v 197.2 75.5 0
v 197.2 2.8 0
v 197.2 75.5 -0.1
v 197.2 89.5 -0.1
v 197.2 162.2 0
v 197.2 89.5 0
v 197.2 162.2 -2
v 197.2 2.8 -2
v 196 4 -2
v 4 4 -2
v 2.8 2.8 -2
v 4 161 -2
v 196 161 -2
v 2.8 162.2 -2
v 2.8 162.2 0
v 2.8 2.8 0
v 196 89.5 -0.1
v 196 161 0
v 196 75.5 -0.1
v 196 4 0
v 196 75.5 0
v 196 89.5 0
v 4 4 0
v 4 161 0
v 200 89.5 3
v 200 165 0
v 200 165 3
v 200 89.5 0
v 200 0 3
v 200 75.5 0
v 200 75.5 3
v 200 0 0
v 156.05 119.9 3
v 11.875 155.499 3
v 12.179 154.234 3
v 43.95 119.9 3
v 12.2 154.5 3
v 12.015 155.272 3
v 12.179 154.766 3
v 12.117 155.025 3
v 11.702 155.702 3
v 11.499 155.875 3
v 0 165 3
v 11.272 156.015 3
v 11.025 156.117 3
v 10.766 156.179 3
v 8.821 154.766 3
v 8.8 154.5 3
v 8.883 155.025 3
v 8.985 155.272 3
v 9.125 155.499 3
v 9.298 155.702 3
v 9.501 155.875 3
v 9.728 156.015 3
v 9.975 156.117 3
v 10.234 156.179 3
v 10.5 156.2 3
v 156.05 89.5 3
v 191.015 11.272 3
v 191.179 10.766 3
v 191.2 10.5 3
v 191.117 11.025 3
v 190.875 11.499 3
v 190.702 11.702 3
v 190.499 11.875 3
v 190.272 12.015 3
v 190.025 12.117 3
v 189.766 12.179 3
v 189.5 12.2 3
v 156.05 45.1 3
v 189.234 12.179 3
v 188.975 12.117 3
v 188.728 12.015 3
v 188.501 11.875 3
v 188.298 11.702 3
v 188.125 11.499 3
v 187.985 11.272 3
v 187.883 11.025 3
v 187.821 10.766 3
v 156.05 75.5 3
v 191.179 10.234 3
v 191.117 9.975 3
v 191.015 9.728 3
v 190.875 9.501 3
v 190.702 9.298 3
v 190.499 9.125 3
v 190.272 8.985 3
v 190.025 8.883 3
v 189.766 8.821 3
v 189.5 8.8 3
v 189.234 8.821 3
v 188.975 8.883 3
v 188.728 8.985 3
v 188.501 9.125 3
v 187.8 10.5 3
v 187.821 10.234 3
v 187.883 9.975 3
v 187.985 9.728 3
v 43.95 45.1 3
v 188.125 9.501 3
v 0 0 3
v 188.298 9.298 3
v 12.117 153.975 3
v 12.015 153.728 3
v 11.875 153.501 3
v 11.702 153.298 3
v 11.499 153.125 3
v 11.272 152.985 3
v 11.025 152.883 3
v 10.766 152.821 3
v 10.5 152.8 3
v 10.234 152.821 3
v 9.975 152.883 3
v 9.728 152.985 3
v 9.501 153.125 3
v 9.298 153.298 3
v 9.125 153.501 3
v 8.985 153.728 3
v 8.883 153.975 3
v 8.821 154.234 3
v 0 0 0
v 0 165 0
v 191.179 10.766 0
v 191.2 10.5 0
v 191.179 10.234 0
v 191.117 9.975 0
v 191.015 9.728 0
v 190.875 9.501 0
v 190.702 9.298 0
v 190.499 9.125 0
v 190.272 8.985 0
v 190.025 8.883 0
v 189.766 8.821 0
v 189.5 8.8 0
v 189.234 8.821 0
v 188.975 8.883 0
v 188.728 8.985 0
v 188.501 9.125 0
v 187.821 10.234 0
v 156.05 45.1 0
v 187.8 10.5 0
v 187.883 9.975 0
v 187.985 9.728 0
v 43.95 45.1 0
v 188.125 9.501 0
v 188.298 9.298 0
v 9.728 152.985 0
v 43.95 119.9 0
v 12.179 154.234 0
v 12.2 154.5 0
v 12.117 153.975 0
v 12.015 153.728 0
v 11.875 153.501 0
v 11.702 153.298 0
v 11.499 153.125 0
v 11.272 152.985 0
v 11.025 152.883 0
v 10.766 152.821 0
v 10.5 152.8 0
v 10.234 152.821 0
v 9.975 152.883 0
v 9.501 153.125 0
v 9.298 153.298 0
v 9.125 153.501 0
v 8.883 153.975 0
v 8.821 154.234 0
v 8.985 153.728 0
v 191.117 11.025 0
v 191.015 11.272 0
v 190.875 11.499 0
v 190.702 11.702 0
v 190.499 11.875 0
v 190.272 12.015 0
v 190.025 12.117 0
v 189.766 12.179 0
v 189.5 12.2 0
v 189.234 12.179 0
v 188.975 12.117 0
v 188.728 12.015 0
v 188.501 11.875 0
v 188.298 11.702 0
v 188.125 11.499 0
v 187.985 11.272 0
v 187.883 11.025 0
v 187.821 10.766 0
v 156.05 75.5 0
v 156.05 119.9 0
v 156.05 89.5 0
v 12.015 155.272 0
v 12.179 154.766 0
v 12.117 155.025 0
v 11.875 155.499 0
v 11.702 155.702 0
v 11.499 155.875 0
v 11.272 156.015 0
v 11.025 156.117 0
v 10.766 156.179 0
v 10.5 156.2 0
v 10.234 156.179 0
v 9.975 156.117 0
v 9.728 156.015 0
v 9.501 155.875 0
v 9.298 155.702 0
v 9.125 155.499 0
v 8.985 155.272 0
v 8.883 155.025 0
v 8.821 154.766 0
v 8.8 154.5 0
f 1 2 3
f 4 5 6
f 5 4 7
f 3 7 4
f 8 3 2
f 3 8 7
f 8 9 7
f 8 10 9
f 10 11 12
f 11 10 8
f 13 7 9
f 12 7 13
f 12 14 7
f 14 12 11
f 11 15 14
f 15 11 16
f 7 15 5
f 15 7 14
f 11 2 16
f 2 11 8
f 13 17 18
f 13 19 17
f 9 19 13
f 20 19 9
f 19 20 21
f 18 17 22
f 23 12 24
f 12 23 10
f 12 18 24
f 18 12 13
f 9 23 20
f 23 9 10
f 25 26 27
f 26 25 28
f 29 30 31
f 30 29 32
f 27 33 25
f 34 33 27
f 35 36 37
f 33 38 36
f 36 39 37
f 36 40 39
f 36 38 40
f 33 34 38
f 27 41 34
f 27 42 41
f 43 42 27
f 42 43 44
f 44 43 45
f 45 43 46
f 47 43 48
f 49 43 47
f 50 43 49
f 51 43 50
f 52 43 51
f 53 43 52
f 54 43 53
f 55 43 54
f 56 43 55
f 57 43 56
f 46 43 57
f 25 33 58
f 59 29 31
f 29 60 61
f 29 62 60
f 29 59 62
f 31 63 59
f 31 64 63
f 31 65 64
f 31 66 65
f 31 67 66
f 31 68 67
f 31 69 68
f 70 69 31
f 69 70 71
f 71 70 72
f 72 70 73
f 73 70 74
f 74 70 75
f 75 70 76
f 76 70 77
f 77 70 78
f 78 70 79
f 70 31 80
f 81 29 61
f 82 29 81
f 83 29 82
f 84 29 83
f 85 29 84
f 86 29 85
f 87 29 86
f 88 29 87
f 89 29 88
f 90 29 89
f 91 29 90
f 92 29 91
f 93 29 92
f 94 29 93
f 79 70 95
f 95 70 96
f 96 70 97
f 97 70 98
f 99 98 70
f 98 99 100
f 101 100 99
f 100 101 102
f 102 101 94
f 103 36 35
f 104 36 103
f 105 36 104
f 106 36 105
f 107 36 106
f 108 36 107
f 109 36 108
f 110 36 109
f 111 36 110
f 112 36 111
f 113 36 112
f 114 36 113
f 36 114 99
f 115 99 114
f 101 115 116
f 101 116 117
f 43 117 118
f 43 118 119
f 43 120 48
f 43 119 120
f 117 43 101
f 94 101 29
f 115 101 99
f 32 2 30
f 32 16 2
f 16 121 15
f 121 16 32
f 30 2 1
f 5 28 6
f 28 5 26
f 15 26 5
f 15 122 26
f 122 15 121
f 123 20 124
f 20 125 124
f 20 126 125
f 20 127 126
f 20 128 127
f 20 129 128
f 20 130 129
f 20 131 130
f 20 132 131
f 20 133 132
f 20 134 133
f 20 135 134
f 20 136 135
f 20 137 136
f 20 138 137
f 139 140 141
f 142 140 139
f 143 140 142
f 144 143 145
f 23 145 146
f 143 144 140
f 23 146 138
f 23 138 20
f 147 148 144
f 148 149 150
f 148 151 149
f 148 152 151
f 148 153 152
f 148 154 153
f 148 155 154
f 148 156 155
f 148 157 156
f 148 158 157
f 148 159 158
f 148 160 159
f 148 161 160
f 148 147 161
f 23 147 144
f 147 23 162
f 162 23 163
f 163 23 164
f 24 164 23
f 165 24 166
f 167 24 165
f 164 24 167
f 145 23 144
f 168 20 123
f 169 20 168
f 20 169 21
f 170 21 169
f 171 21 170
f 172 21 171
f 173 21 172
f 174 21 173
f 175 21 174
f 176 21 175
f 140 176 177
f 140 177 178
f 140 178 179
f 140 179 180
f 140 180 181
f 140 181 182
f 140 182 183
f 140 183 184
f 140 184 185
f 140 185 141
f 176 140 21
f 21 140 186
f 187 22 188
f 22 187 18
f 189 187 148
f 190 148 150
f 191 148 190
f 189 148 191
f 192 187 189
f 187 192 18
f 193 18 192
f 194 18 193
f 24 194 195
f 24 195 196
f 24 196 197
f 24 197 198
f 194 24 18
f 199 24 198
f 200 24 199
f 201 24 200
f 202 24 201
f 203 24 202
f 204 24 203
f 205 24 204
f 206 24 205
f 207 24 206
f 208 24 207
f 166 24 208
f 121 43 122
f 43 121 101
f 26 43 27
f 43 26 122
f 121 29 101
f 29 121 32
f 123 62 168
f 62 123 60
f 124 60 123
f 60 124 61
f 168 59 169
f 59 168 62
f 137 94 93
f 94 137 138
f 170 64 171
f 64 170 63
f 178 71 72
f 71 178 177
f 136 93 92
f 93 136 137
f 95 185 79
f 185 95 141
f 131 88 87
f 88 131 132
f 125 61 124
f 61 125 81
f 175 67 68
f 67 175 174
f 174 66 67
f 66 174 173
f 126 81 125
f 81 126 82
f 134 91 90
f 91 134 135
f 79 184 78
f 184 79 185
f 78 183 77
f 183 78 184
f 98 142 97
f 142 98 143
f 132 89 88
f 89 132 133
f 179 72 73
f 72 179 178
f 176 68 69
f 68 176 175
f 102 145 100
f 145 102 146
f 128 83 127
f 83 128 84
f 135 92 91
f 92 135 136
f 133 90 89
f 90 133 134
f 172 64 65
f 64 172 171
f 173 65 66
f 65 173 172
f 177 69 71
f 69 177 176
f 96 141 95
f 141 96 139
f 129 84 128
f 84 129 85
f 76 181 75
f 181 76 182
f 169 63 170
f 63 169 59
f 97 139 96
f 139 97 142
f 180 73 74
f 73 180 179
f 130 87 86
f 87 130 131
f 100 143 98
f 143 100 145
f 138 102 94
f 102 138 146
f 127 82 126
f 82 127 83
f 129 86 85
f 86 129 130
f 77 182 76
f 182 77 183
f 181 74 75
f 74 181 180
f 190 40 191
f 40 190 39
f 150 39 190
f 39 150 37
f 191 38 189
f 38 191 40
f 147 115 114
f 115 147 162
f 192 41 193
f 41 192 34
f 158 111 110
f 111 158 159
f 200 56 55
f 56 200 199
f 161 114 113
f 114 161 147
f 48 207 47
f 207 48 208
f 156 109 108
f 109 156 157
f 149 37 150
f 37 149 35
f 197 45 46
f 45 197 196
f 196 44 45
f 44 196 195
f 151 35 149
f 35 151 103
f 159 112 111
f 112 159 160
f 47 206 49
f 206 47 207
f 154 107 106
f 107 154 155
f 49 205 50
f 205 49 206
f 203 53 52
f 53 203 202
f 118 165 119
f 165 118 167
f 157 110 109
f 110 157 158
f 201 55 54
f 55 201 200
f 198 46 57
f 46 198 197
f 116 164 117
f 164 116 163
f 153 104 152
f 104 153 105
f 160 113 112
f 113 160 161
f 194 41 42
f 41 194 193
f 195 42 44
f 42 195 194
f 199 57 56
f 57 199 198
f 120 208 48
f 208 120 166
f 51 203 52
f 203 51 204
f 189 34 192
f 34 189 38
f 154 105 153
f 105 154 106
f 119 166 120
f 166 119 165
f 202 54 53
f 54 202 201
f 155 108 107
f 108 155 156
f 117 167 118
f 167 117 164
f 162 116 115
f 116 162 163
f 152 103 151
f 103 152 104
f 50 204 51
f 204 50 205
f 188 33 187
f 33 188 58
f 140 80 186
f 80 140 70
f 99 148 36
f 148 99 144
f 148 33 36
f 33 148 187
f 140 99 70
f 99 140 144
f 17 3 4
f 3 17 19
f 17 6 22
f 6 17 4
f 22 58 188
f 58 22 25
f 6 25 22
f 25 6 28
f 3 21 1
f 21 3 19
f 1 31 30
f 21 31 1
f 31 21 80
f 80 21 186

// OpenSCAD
// =============================================================================
// DOA Flat Enclosure - LID (Waveshare ESP32-S3-Touch-LCD-4.3B BOX)
// =============================================================================
//
// DESIGN 1: Drop-through mount
//
// Mates with doa_enclosure_body.scad (same lip/boss geometry as original lid).
// The Waveshare 4.3B BOX enclosure drops through a cutout from below.
// The front face lip (116.30 x 79.00) rests on the lid top surface.
// Body walls provide XY registration; lip + gravity provide Z retention.
// A USB cable slit on the right side routes a cable into the enclosure.
//
// Print orientation: lid flat on bed, top face up (lip hangs down).
// =============================================================================

$fn = 40;

// =============================================================================
// BODY-DERIVED CONSTANTS  --  keep in sync with doa_enclosure_body.scad
// =============================================================================

wall       = 2.5;
interior_w = 195;
interior_d = 160;
interior_h = 52;

enc_w = interior_w + 2*wall;    // 200 mm
enc_d = interior_d + 2*wall;    // 165 mm

ledge_drop = 2;

lid_boss_pos = [
    [interior_w - 8,   8],
    [8,                interior_d - 8]
];
m3_clear_d = 3.4;

// =============================================================================
// LID GEOMETRY
// =============================================================================

lid_t   = 3.0;    // top plate thickness
lip_t   = 1.2;    // downward lip wall thickness
lip_clr = 0.3;    // clearance between lip and interior wall
lip_h   = ledge_drop;

// =============================================================================
// WAVESHARE ESP32-S3-TOUCH-LCD-4.3B  BOX  PARAMETERS
// (from Waveshare dimensional drawing, unit: mm)
// =============================================================================
//
//   Front face (glass up) ........ 116.30 x 79.00 mm
//   Body (behind lip) ............ 111.30 x 74.00 mm  (tapered shell)
//   Lip step ..................... 2.50 mm all around
//   Total depth .................. 18.00 mm
//   Active area .................. 95.54 x 54.36 mm (800x480)
//   Active area offset ........... 10.38 mm left, 10.38 mm top
//                                  10.38 mm right, 14.26 mm bottom (asymmetric)
//   Mounting holes (back) ........ 75.00 x 59.00 mm c-to-c, M4 brass inserts
//   USB-C port ................... right short edge, 2.50 mm from front face
//   Terminal block ............... bottom edge of back, 52.50 x 3.50 mm protrusion
//
// NOTE: box_body_h = 74.00 is estimated from drawing (front_h - 2*lip_step).
// Measure with calipers and adjust if the vertical taper differs from horizontal.

// Front face dimensions
box_front_w = 116.30;
box_front_h =  79.00;

// Body dimensions (tapered shell behind the front face lip)
box_body_w  = 111.30;
box_body_h  =  74.00;

// Shell taper / lip overhang
box_lip_step = (box_front_w - box_body_w) / 2;   // 2.50 mm

// Total depth
box_depth = 18.00;

// Active area
box_active_w   =  95.54;
box_active_h   =  54.36;
box_active_x   =  10.38;   // from left front face edge
box_active_y_top = 10.38;  // from top front face edge
// bottom border: 79.00 - 54.36 - 10.38 = 14.26 mm

// USB-C port location (right short edge)
usb_c_from_front = 2.50;   // port center, from front face surface
usb_c_port_w     = 10.0;   // clearance width for cable+connector

// =============================================================================
// CUTOUT PARAMETERS
// =============================================================================

body_clr = 0.40;    // clearance around body in through-hole

// Through-hole sized to body (BOX body passes through, lip catches)
cutout_w = box_body_w + 2*body_clr;    // ~112.10
cutout_h = box_body_h + 2*body_clr;    // ~74.80

// =============================================================================
// BOX PLACEMENT ON LID
// =============================================================================
// Centered on lid. USB-C faces right (high-X direction).
// Adjust these if you want to shift the display position.

box_center_x = enc_w / 2;
box_center_y = enc_d / 2;

// Origin = bottom-left corner of front face (in lid coords)
box_origin_x = box_center_x - box_front_w / 2;
box_origin_y = box_center_y - box_front_h / 2;

// Body origin (offset inward by lip step)
body_origin_x = box_origin_x + box_lip_step;
body_origin_y = box_origin_y + box_lip_step;

// =============================================================================
// USB CABLE SLIT
// =============================================================================
// Slit from the cutout's right edge toward the lid perimeter,
// allowing a USB-C cable to route from the BOX port into the enclosure.

usb_slit_w     = 14.0;    // wide enough for USB-C connector + cable
usb_slit_depth = lid_t;   // full lid thickness
// Vertical position: centered on box short edge
usb_slit_y     = box_center_y;

// =============================================================================
// RENDER
// =============================================================================

difference() {
    union() {
        top_plate();
        lid_lip();
    }
    body_corner_clearances();
    box_cutout();
    usb_cable_slit();
}

// Uncomment to visualize display placement:
 %preview_box();

// =============================================================================
// MODULES
// =============================================================================

module top_plate() {
    cube([enc_w, enc_d, lid_t]);
}

module lid_lip() {
    lip_outer_w = interior_w - 2*lip_clr;
    lip_outer_d = interior_d - 2*lip_clr;
    translate([wall + lip_clr, wall + lip_clr, -lip_h])
    difference() {
        cube([lip_outer_w, lip_outer_d, lip_h + 0.01]);
        translate([lip_t, lip_t, -0.1])
            cube([lip_outer_w - 2*lip_t,
                  lip_outer_d - 2*lip_t,
                  lip_h + 0.3]);
    }
}

module body_corner_clearances() {
    for (pos = lid_boss_pos) {
        translate([wall + pos[0], wall + pos[1], -0.1])
            cylinder(d=m3_clear_d, h=lid_t + 0.2);
    }
}

// Through-hole cutout: body passes through, front face lip rests on surface.
module box_cutout() {
    translate([body_origin_x - body_clr,
               body_origin_y - body_clr,
               -0.1])
        cube([cutout_w, cutout_h, lid_t + 0.2]);
}

// Slit from cutout right edge to lid right edge for USB cable routing.
// The cable plugs into the BOX's USB-C port (right side) and drops
// through this slit into the enclosure interior.
module usb_cable_slit() {
    slit_x_start = body_origin_x + box_body_w + body_clr;
    slit_x_end   = enc_w + 0.1;
    translate([slit_x_start - 0.1,
               usb_slit_y - usb_slit_w/2,
               -0.1])
        cube([slit_x_end - slit_x_start + 0.2,
              usb_slit_w,
              lid_t + 0.2]);
}

// =============================================================================
// PREVIEW
// =============================================================================

module preview_box() {
    // Front face / glass (dark grey, sits on lid surface)
    color("dimgrey", 0.6)
    translate([box_origin_x, box_origin_y, 0])
        cube([box_front_w, box_front_h, 2.50]);

    // Body (hangs below lid)
    color("black", 0.4)
    translate([body_origin_x, body_origin_y, -(box_depth - box_lip_step)])
        cube([box_body_w, box_body_h, box_depth - box_lip_step]);

    // Active area (green)
    color("lime", 0.7)
    translate([box_origin_x + box_active_x,
               box_origin_y + (box_front_h - box_active_y_top - box_active_h),
               2.6])
        cube([box_active_w, box_active_h, 0.3]);

    // USB-C port indicator (red, right side)
    color("red", 0.8)
    translate([box_origin_x + box_front_w - 0.1,
               box_center_y - 4.5,
               -usb_c_from_front])
        cube([5, 9, 3.5]);
}

// =============================================================================
// DIMENSION CHECKS
// =============================================================================

echo("==========================================================");
echo("DOA FLAT ENCLOSURE - LID (4.3B BOX DROP-THROUGH)");
echo("==========================================================");
echo(str("Lid outer: ", enc_w, " x ", enc_d, " x ", lid_t, " mm"));
echo(str("Cutout (body): ", cutout_w, " x ", cutout_h, " mm (through lid)"));
echo(str("Lip overhang: ", box_lip_step - body_clr, " mm (front face rests on lid)"));
echo(str("BOX front face: ", box_front_w, " x ", box_front_h, " mm"));
echo(str("BOX body: ", box_body_w, " x ", box_body_h, " mm"));
echo(str("BOX center on lid: (", box_center_x, ", ", box_center_y, ")"));
echo(str("USB slit: ", usb_slit_w, " mm wide, right side"));
echo(str("Active area: ", box_active_w, " x ", box_active_h, " mm"));
